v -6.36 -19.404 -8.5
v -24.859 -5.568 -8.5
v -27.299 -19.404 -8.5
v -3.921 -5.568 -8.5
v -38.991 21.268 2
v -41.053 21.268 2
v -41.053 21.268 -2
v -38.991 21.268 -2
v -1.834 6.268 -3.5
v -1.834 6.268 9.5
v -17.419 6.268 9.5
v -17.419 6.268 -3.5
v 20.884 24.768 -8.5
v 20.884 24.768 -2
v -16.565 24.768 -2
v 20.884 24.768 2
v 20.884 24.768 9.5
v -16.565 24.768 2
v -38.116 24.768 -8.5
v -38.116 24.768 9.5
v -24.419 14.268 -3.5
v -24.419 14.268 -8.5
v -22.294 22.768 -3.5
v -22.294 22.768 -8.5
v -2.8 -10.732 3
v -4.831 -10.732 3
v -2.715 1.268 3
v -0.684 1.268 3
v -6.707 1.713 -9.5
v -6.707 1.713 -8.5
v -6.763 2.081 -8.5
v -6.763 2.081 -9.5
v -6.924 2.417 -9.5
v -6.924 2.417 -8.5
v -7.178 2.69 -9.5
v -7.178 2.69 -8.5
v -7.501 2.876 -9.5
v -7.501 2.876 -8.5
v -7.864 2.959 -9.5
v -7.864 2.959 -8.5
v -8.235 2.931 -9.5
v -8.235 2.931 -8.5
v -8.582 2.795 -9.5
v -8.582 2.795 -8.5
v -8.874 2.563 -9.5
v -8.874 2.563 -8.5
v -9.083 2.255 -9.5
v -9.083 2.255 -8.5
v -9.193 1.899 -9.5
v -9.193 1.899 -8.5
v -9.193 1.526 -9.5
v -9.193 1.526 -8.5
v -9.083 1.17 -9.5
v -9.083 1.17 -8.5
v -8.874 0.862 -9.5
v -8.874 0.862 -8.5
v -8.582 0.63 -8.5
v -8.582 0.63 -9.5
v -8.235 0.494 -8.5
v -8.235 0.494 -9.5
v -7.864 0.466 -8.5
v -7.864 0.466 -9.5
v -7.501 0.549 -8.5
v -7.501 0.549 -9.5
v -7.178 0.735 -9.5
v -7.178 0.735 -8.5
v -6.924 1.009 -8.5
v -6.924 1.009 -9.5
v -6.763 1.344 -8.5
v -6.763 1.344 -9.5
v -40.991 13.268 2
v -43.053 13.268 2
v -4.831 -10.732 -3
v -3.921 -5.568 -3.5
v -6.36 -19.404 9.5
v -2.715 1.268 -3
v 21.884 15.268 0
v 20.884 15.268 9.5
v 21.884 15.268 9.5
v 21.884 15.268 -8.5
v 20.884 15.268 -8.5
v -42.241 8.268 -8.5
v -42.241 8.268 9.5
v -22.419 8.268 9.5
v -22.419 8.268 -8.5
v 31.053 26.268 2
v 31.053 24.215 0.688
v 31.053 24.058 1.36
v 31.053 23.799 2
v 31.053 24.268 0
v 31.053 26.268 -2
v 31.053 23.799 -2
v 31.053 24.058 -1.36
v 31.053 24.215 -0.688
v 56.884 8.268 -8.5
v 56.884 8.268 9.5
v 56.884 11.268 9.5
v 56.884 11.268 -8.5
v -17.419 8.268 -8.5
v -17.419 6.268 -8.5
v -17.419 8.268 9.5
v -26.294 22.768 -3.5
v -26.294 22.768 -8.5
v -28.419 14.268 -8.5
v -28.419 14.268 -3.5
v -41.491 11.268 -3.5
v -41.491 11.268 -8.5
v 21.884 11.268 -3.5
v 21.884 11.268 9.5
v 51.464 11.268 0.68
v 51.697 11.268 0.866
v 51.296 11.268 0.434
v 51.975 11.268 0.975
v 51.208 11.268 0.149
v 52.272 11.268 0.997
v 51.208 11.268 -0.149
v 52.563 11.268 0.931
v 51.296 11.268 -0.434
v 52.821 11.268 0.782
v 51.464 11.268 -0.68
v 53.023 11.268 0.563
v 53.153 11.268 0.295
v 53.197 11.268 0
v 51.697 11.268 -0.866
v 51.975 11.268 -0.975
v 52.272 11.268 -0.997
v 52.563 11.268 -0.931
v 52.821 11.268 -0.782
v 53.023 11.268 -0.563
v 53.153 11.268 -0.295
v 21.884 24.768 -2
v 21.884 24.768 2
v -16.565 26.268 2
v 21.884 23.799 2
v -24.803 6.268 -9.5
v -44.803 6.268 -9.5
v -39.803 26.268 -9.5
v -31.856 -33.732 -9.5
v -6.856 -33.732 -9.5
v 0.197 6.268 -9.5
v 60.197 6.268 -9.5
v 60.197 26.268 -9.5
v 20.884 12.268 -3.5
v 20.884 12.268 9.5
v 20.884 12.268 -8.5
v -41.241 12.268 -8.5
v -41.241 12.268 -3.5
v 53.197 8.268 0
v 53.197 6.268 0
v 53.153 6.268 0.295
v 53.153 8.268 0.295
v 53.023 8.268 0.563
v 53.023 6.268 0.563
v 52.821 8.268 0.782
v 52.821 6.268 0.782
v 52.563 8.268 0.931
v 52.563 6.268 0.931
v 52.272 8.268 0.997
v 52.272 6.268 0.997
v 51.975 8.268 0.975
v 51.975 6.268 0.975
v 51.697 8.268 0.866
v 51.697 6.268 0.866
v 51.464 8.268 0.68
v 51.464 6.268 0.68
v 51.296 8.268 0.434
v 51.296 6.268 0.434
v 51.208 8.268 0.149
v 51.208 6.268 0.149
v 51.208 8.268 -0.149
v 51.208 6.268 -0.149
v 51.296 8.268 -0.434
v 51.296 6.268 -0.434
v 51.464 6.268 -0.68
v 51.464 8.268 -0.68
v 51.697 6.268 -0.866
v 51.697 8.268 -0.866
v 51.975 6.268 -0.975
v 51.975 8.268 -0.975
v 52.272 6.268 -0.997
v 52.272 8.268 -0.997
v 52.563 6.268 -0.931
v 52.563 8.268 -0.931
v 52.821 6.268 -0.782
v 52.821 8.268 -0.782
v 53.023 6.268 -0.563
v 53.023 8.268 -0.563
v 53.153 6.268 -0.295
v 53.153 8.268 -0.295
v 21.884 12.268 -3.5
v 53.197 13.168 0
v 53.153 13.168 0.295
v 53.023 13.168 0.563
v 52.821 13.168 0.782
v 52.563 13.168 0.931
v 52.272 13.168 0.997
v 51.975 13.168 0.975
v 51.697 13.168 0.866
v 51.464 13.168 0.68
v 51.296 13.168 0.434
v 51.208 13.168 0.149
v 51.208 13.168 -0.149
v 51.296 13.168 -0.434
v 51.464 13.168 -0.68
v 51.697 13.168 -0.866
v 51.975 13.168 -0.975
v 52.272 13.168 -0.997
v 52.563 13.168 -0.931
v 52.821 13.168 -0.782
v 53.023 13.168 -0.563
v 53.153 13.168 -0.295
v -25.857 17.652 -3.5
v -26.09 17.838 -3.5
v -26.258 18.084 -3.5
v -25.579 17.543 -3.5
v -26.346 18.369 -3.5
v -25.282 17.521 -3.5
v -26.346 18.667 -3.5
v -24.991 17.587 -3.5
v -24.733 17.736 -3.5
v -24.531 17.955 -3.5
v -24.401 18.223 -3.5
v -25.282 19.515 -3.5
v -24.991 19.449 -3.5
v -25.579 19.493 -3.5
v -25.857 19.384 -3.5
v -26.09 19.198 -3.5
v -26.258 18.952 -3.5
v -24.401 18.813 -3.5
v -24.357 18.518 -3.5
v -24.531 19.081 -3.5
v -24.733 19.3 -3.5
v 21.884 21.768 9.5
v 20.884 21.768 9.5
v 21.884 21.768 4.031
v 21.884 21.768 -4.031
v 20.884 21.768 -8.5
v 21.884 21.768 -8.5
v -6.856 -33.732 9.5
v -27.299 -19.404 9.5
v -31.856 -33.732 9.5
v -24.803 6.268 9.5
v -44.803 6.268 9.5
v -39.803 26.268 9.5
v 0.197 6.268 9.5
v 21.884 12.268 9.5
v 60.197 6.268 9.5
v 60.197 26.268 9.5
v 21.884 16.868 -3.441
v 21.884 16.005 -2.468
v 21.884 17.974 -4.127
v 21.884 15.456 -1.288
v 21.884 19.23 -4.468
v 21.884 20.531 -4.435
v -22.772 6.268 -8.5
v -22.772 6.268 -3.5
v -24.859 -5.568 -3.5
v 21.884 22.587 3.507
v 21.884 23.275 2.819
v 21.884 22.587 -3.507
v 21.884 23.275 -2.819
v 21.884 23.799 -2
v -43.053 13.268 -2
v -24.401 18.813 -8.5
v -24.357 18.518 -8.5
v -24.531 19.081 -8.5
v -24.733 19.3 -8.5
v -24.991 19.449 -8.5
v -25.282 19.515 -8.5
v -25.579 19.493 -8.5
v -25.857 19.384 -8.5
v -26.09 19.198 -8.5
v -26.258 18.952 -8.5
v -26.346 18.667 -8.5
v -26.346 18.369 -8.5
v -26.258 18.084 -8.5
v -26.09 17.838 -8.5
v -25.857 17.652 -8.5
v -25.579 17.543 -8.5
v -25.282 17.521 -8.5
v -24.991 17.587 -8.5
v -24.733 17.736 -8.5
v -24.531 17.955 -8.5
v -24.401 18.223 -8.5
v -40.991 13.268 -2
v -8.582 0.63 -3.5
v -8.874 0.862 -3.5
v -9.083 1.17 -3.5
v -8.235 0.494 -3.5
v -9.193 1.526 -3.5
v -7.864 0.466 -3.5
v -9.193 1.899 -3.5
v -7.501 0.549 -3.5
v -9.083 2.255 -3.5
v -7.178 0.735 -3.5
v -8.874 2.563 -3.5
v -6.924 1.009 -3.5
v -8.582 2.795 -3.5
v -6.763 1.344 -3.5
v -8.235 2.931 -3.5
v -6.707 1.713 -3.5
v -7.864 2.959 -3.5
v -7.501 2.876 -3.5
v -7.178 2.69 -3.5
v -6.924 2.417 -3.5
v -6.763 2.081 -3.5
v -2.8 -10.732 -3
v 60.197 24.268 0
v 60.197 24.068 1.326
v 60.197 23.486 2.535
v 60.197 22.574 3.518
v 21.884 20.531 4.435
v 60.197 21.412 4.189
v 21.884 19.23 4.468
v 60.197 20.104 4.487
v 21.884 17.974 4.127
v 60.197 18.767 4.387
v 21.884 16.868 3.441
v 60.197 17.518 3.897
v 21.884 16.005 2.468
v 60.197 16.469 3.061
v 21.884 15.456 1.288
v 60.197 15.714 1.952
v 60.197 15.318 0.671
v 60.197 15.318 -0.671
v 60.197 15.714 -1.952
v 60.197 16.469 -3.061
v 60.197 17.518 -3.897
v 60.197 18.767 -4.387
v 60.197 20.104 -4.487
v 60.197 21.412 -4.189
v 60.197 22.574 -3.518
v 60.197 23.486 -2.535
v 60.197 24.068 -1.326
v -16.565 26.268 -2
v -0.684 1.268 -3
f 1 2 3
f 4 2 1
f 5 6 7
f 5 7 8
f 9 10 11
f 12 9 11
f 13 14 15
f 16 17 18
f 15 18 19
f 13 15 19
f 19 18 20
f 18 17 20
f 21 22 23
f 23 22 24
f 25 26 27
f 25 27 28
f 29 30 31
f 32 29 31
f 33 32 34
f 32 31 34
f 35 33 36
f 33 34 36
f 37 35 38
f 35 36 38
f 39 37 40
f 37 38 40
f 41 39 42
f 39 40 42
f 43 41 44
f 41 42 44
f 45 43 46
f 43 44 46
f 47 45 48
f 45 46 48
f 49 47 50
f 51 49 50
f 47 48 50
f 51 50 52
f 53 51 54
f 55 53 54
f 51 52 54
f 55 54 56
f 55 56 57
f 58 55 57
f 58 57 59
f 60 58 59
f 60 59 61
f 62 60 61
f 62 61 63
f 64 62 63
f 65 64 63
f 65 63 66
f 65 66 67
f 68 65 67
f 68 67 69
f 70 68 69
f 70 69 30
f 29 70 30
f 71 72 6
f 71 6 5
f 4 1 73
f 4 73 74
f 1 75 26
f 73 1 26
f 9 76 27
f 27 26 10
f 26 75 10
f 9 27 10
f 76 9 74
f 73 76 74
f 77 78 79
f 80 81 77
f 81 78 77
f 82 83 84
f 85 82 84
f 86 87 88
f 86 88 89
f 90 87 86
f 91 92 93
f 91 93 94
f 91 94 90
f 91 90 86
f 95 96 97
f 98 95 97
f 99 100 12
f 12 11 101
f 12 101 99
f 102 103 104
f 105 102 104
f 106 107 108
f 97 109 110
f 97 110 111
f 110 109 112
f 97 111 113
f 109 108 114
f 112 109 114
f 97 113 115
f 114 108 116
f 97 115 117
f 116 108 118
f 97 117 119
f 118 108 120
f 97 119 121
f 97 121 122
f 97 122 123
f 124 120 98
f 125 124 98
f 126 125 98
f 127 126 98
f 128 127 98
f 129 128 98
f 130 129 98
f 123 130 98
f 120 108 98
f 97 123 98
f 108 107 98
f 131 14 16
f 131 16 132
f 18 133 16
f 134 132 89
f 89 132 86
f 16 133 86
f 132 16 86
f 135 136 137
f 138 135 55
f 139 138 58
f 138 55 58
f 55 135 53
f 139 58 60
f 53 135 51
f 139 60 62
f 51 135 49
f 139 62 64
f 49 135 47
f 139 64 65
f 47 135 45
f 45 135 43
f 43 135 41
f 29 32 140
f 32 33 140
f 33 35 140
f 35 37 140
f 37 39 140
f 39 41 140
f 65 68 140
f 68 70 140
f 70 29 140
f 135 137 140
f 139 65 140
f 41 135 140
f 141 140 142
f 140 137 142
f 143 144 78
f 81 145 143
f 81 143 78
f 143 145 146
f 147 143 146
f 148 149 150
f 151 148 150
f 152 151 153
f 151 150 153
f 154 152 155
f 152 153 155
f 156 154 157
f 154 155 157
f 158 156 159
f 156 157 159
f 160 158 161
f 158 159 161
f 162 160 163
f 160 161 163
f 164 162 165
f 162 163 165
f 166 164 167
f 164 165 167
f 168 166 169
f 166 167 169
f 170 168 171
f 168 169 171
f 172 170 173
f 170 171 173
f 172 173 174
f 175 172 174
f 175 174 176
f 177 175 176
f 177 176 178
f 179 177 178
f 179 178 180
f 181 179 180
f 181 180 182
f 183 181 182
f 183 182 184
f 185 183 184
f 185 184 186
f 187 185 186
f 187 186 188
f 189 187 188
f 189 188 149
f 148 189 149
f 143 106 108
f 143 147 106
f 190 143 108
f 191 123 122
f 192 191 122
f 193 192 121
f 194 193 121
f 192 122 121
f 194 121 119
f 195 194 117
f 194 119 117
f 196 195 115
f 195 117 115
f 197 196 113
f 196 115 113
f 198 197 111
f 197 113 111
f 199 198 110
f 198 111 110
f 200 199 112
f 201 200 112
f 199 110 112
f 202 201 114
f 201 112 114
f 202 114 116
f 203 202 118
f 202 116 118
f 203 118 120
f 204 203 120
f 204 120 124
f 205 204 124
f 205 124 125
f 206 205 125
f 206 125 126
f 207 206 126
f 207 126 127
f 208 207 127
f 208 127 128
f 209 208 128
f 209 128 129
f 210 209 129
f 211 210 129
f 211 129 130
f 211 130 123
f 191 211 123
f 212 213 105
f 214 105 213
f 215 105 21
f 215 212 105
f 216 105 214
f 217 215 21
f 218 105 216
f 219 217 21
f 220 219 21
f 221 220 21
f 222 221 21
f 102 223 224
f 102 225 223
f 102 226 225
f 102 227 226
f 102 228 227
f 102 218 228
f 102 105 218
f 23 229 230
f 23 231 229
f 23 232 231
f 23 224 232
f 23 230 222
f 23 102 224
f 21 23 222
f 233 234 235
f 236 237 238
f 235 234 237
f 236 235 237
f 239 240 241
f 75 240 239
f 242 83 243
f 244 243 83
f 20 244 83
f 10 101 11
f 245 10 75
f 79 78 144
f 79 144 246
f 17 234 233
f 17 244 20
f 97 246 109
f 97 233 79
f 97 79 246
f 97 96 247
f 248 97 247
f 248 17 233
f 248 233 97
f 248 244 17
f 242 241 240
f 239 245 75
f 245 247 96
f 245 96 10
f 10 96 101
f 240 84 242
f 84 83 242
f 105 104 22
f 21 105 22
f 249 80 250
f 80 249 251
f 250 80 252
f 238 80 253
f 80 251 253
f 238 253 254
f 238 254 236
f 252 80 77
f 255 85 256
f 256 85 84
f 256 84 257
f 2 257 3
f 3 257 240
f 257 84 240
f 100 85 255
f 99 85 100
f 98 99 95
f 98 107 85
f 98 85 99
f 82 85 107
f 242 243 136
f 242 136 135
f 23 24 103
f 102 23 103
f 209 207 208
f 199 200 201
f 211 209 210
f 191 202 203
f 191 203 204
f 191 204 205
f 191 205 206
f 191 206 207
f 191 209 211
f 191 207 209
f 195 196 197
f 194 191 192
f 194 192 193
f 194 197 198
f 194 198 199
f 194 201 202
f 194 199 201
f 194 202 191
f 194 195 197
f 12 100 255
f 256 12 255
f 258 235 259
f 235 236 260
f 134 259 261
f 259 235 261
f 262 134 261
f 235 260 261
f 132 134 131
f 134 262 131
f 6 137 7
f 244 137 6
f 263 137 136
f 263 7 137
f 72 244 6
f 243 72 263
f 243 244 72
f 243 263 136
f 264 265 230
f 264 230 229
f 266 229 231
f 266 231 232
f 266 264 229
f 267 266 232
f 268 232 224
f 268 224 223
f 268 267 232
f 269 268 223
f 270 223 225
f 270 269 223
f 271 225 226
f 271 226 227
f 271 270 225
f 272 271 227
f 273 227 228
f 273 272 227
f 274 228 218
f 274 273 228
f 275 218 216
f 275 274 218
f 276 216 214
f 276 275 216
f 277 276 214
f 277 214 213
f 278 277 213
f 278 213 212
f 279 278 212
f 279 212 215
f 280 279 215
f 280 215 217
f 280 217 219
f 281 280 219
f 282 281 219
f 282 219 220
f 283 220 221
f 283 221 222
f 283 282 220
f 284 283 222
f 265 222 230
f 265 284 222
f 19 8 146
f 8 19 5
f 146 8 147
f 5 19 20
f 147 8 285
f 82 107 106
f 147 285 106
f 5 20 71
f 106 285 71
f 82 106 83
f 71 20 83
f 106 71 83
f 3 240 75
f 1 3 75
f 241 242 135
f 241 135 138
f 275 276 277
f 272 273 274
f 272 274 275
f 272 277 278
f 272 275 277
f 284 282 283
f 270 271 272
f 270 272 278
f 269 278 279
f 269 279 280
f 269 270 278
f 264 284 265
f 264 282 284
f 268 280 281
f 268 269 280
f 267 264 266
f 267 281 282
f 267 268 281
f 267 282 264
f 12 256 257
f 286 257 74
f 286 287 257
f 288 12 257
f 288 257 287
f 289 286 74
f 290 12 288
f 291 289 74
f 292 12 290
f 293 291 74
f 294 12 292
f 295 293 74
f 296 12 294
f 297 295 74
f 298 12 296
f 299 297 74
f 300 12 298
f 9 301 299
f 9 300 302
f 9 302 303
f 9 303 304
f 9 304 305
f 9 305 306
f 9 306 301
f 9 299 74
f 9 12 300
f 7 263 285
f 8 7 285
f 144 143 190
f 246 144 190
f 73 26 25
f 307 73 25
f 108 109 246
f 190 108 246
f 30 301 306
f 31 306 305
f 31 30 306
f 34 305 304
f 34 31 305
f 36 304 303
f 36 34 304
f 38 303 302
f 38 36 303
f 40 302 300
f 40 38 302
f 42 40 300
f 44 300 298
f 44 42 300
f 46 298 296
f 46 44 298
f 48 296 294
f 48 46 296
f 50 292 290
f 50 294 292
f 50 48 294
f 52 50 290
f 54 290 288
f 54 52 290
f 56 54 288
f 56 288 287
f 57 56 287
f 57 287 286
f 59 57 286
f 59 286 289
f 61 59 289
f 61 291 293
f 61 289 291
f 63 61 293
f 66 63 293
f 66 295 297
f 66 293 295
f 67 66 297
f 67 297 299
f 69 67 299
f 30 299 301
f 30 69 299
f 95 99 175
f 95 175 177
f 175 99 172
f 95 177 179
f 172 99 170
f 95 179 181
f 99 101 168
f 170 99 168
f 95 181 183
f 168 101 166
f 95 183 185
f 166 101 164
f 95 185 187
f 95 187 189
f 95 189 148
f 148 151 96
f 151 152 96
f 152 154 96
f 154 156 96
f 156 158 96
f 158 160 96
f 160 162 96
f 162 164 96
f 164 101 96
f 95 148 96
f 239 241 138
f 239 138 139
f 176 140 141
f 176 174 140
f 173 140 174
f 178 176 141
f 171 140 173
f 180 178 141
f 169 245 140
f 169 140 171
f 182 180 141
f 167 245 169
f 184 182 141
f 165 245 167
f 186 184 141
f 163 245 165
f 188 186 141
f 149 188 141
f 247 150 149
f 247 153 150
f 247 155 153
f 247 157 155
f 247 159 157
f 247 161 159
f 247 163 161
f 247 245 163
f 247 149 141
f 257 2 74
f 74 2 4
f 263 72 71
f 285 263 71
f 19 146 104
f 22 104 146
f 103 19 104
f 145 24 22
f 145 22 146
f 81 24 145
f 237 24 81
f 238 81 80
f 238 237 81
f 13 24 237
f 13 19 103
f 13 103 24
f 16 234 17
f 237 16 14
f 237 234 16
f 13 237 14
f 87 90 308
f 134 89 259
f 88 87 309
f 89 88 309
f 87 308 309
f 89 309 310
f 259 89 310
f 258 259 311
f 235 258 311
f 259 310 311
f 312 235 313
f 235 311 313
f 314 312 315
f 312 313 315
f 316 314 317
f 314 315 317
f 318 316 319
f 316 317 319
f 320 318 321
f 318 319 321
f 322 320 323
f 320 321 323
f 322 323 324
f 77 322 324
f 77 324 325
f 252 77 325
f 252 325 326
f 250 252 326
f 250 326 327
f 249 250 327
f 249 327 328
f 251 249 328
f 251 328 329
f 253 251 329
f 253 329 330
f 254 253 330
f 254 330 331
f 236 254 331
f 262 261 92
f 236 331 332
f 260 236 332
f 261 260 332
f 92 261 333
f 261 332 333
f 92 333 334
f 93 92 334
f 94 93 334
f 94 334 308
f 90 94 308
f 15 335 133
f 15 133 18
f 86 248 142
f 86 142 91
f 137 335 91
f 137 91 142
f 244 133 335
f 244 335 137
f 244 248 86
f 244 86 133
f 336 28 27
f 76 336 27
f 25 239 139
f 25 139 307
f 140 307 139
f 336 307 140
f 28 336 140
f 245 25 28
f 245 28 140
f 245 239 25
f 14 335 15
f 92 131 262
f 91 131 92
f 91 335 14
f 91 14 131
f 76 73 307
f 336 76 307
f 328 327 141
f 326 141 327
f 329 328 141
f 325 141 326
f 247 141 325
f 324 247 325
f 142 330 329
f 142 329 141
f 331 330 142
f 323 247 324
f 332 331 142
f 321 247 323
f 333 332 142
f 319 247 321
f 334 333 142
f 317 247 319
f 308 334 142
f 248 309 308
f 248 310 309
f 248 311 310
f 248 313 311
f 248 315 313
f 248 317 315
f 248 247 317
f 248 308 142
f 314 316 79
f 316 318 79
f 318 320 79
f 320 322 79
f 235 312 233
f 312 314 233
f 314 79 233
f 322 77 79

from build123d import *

# Parameters (mm, degrees)
F1_DEPTH  = 9.5
F3_DEPTH  = 18
F4_R      = 4.5
F5_DEPTH  = 40
F6_W      = 10.7216464161
F6_H      = 8
F7_DEPTH  = 2
F8_R      = 1
F9_DEPTH  = 5
F8_W      = 1
F8_H      = 3
F10_DEPTH = 18
F11_DEPTH = 18
F12_R     = 1
F13_DEPTH = 6.9
F15_DEPTH = 3
F16_R     = 1.25
F17_DEPTH = 5
F18_DEPTH = 25


with BuildPart() as f1:
    # F0 (on Top) → F1 (new body, symmetric)
    with BuildSketch(Plane.XY):
        Polygon((60.1971853051, 26.2679918303), (-39.8028146949, 26.2679918303), (-44.8028146949, 6.2679918303), (-24.8028146949, 6.2679918303), (-31.8558939232, -33.7320081697), (-6.8558939232, -33.7320081697), (0.1971853051, 6.2679918303), (60.1971853051, 6.2679918303), align=None)
    extrude(amount=F1_DEPTH, both=True)

    # F2 (on face) → F3 (cut)
    with BuildSketch(Plane.XY.offset(9.5)):
        Polygon((21.8837381179, 24.7679918303), (-38.1162618821, 24.7679918303), (-42.2412618821, 8.2679918303), (-22.4193075097, 8.2679918303), (-27.2986237894, -19.4039858791), (-6.3603302369, -19.4039858791), (-1.8336679186, 6.2679918303), (-17.4193075097, 6.2679918303), (-17.4193075097, 8.2679918303), (56.8837381179, 8.2679918303), (56.8837381179, 11.2679918303), (21.8837381179, 11.2679918303), align=None)
    extrude(amount=-F3_DEPTH, mode=Mode.SUBTRACT)

    # F4 (on face) → F5 (cut)
    with BuildSketch(Plane.YZ.offset(60.1971853051)):
        with Locations((19.7679918303, 0)):
            Circle(F4_R)
    extrude(amount=-F5_DEPTH, mode=Mode.SUBTRACT)

    # F6 (on Top) → F7 (cut, symmetric)
    with BuildSketch(Plane.XY):
        Polygon((31.0530696271, 22.4650362791), (31.0530696271, 31.3576222958), (-16.5646290837, 30.772159468), (-16.5646290837, 22.4650362791), align=None)
        with Locations((-41.1441657065, 17.2679918303)):
            Rectangle(F6_W, F6_H)
    extrude(amount=F7_DEPTH, both=True, mode=Mode.SUBTRACT)

    # F8 (on face) → F9 (join)
    with BuildSketch(Plane.XY.offset(-8.5)):
        Polygon((-41.4912618821, 11.2679918303), (21.8837381179, 11.2679918303), (21.8837381179, 12.2679918303), (20.8837381179, 12.2679918303), (-41.2412618821, 12.2679918303), align=None)
        Polygon((-17.4193075097, 6.2679918303), (-22.7719614711, 6.2679918303), (-24.8589656495, -5.5679970244), (-3.9206720971, -5.5679970244), (-1.8336679186, 6.2679918303), align=None)
        Polygon((-28.4193075097, 14.2679918303), (-24.4193075097, 14.2679918303), (-22.2943075097, 22.7679918303), (-26.2943075097, 22.7679918303), align=None)
        with Locations((-25.3568075097, 18.5179918303)):
            Circle(F8_R, mode=Mode.SUBTRACT)
    extrude(amount=F9_DEPTH)

    # F8 (on face) → F10 (join, through all)
    with BuildSketch(Plane.XY.offset(-8.5)):
        with Locations((21.3837381179, 23.2679918303)):
            Rectangle(F8_W, F8_H)
    extrude(amount=F10_DEPTH)

    # F8 (on face) → F11 (join, through all)
    with BuildSketch(Plane.XY.offset(-8.5)):
        with Locations((21.3837381179, 13.7679918303)):
            Rectangle(F8_W, F8_H)
    extrude(amount=F11_DEPTH)

    # F12 (on face) → F13 (cut)
    with BuildSketch(Plane.XZ.offset(-6.2679918303)):
        with Locations((52.1971853051, 0)):
            Circle(F12_R)
    extrude(amount=-F13_DEPTH, mode=Mode.SUBTRACT)

    # F14 (on Top) → F15 (cut, symmetric)
    with BuildSketch(Plane.XY):
        Polygon((7.0393216934, 1.2679918303), (-9.7211528242, 1.2679918303), (-8.9475925263, -10.7320081697), (7.0393216934, -10.7320081697), align=None)
    extrude(amount=F15_DEPTH, both=True, mode=Mode.SUBTRACT)

    # F16 (on face) → F17 (cut)
    with BuildSketch(Plane.XY.offset(-8.5)):
        with Locations((-7.9571865499, 1.7126952298)):
            Circle(F16_R)
    extrude(amount=-F17_DEPTH, mode=Mode.SUBTRACT)

    # F18 (cut): a face of the model
    f18_faces = [f1.faces().sort_by_distance(p)[0] for p in [
        (-7.9571865499, 1.7126952298, -8.5),
    ]]
    extrude(f18_faces, amount=-F18_DEPTH, mode=Mode.SUBTRACT)


solid = f1.part
